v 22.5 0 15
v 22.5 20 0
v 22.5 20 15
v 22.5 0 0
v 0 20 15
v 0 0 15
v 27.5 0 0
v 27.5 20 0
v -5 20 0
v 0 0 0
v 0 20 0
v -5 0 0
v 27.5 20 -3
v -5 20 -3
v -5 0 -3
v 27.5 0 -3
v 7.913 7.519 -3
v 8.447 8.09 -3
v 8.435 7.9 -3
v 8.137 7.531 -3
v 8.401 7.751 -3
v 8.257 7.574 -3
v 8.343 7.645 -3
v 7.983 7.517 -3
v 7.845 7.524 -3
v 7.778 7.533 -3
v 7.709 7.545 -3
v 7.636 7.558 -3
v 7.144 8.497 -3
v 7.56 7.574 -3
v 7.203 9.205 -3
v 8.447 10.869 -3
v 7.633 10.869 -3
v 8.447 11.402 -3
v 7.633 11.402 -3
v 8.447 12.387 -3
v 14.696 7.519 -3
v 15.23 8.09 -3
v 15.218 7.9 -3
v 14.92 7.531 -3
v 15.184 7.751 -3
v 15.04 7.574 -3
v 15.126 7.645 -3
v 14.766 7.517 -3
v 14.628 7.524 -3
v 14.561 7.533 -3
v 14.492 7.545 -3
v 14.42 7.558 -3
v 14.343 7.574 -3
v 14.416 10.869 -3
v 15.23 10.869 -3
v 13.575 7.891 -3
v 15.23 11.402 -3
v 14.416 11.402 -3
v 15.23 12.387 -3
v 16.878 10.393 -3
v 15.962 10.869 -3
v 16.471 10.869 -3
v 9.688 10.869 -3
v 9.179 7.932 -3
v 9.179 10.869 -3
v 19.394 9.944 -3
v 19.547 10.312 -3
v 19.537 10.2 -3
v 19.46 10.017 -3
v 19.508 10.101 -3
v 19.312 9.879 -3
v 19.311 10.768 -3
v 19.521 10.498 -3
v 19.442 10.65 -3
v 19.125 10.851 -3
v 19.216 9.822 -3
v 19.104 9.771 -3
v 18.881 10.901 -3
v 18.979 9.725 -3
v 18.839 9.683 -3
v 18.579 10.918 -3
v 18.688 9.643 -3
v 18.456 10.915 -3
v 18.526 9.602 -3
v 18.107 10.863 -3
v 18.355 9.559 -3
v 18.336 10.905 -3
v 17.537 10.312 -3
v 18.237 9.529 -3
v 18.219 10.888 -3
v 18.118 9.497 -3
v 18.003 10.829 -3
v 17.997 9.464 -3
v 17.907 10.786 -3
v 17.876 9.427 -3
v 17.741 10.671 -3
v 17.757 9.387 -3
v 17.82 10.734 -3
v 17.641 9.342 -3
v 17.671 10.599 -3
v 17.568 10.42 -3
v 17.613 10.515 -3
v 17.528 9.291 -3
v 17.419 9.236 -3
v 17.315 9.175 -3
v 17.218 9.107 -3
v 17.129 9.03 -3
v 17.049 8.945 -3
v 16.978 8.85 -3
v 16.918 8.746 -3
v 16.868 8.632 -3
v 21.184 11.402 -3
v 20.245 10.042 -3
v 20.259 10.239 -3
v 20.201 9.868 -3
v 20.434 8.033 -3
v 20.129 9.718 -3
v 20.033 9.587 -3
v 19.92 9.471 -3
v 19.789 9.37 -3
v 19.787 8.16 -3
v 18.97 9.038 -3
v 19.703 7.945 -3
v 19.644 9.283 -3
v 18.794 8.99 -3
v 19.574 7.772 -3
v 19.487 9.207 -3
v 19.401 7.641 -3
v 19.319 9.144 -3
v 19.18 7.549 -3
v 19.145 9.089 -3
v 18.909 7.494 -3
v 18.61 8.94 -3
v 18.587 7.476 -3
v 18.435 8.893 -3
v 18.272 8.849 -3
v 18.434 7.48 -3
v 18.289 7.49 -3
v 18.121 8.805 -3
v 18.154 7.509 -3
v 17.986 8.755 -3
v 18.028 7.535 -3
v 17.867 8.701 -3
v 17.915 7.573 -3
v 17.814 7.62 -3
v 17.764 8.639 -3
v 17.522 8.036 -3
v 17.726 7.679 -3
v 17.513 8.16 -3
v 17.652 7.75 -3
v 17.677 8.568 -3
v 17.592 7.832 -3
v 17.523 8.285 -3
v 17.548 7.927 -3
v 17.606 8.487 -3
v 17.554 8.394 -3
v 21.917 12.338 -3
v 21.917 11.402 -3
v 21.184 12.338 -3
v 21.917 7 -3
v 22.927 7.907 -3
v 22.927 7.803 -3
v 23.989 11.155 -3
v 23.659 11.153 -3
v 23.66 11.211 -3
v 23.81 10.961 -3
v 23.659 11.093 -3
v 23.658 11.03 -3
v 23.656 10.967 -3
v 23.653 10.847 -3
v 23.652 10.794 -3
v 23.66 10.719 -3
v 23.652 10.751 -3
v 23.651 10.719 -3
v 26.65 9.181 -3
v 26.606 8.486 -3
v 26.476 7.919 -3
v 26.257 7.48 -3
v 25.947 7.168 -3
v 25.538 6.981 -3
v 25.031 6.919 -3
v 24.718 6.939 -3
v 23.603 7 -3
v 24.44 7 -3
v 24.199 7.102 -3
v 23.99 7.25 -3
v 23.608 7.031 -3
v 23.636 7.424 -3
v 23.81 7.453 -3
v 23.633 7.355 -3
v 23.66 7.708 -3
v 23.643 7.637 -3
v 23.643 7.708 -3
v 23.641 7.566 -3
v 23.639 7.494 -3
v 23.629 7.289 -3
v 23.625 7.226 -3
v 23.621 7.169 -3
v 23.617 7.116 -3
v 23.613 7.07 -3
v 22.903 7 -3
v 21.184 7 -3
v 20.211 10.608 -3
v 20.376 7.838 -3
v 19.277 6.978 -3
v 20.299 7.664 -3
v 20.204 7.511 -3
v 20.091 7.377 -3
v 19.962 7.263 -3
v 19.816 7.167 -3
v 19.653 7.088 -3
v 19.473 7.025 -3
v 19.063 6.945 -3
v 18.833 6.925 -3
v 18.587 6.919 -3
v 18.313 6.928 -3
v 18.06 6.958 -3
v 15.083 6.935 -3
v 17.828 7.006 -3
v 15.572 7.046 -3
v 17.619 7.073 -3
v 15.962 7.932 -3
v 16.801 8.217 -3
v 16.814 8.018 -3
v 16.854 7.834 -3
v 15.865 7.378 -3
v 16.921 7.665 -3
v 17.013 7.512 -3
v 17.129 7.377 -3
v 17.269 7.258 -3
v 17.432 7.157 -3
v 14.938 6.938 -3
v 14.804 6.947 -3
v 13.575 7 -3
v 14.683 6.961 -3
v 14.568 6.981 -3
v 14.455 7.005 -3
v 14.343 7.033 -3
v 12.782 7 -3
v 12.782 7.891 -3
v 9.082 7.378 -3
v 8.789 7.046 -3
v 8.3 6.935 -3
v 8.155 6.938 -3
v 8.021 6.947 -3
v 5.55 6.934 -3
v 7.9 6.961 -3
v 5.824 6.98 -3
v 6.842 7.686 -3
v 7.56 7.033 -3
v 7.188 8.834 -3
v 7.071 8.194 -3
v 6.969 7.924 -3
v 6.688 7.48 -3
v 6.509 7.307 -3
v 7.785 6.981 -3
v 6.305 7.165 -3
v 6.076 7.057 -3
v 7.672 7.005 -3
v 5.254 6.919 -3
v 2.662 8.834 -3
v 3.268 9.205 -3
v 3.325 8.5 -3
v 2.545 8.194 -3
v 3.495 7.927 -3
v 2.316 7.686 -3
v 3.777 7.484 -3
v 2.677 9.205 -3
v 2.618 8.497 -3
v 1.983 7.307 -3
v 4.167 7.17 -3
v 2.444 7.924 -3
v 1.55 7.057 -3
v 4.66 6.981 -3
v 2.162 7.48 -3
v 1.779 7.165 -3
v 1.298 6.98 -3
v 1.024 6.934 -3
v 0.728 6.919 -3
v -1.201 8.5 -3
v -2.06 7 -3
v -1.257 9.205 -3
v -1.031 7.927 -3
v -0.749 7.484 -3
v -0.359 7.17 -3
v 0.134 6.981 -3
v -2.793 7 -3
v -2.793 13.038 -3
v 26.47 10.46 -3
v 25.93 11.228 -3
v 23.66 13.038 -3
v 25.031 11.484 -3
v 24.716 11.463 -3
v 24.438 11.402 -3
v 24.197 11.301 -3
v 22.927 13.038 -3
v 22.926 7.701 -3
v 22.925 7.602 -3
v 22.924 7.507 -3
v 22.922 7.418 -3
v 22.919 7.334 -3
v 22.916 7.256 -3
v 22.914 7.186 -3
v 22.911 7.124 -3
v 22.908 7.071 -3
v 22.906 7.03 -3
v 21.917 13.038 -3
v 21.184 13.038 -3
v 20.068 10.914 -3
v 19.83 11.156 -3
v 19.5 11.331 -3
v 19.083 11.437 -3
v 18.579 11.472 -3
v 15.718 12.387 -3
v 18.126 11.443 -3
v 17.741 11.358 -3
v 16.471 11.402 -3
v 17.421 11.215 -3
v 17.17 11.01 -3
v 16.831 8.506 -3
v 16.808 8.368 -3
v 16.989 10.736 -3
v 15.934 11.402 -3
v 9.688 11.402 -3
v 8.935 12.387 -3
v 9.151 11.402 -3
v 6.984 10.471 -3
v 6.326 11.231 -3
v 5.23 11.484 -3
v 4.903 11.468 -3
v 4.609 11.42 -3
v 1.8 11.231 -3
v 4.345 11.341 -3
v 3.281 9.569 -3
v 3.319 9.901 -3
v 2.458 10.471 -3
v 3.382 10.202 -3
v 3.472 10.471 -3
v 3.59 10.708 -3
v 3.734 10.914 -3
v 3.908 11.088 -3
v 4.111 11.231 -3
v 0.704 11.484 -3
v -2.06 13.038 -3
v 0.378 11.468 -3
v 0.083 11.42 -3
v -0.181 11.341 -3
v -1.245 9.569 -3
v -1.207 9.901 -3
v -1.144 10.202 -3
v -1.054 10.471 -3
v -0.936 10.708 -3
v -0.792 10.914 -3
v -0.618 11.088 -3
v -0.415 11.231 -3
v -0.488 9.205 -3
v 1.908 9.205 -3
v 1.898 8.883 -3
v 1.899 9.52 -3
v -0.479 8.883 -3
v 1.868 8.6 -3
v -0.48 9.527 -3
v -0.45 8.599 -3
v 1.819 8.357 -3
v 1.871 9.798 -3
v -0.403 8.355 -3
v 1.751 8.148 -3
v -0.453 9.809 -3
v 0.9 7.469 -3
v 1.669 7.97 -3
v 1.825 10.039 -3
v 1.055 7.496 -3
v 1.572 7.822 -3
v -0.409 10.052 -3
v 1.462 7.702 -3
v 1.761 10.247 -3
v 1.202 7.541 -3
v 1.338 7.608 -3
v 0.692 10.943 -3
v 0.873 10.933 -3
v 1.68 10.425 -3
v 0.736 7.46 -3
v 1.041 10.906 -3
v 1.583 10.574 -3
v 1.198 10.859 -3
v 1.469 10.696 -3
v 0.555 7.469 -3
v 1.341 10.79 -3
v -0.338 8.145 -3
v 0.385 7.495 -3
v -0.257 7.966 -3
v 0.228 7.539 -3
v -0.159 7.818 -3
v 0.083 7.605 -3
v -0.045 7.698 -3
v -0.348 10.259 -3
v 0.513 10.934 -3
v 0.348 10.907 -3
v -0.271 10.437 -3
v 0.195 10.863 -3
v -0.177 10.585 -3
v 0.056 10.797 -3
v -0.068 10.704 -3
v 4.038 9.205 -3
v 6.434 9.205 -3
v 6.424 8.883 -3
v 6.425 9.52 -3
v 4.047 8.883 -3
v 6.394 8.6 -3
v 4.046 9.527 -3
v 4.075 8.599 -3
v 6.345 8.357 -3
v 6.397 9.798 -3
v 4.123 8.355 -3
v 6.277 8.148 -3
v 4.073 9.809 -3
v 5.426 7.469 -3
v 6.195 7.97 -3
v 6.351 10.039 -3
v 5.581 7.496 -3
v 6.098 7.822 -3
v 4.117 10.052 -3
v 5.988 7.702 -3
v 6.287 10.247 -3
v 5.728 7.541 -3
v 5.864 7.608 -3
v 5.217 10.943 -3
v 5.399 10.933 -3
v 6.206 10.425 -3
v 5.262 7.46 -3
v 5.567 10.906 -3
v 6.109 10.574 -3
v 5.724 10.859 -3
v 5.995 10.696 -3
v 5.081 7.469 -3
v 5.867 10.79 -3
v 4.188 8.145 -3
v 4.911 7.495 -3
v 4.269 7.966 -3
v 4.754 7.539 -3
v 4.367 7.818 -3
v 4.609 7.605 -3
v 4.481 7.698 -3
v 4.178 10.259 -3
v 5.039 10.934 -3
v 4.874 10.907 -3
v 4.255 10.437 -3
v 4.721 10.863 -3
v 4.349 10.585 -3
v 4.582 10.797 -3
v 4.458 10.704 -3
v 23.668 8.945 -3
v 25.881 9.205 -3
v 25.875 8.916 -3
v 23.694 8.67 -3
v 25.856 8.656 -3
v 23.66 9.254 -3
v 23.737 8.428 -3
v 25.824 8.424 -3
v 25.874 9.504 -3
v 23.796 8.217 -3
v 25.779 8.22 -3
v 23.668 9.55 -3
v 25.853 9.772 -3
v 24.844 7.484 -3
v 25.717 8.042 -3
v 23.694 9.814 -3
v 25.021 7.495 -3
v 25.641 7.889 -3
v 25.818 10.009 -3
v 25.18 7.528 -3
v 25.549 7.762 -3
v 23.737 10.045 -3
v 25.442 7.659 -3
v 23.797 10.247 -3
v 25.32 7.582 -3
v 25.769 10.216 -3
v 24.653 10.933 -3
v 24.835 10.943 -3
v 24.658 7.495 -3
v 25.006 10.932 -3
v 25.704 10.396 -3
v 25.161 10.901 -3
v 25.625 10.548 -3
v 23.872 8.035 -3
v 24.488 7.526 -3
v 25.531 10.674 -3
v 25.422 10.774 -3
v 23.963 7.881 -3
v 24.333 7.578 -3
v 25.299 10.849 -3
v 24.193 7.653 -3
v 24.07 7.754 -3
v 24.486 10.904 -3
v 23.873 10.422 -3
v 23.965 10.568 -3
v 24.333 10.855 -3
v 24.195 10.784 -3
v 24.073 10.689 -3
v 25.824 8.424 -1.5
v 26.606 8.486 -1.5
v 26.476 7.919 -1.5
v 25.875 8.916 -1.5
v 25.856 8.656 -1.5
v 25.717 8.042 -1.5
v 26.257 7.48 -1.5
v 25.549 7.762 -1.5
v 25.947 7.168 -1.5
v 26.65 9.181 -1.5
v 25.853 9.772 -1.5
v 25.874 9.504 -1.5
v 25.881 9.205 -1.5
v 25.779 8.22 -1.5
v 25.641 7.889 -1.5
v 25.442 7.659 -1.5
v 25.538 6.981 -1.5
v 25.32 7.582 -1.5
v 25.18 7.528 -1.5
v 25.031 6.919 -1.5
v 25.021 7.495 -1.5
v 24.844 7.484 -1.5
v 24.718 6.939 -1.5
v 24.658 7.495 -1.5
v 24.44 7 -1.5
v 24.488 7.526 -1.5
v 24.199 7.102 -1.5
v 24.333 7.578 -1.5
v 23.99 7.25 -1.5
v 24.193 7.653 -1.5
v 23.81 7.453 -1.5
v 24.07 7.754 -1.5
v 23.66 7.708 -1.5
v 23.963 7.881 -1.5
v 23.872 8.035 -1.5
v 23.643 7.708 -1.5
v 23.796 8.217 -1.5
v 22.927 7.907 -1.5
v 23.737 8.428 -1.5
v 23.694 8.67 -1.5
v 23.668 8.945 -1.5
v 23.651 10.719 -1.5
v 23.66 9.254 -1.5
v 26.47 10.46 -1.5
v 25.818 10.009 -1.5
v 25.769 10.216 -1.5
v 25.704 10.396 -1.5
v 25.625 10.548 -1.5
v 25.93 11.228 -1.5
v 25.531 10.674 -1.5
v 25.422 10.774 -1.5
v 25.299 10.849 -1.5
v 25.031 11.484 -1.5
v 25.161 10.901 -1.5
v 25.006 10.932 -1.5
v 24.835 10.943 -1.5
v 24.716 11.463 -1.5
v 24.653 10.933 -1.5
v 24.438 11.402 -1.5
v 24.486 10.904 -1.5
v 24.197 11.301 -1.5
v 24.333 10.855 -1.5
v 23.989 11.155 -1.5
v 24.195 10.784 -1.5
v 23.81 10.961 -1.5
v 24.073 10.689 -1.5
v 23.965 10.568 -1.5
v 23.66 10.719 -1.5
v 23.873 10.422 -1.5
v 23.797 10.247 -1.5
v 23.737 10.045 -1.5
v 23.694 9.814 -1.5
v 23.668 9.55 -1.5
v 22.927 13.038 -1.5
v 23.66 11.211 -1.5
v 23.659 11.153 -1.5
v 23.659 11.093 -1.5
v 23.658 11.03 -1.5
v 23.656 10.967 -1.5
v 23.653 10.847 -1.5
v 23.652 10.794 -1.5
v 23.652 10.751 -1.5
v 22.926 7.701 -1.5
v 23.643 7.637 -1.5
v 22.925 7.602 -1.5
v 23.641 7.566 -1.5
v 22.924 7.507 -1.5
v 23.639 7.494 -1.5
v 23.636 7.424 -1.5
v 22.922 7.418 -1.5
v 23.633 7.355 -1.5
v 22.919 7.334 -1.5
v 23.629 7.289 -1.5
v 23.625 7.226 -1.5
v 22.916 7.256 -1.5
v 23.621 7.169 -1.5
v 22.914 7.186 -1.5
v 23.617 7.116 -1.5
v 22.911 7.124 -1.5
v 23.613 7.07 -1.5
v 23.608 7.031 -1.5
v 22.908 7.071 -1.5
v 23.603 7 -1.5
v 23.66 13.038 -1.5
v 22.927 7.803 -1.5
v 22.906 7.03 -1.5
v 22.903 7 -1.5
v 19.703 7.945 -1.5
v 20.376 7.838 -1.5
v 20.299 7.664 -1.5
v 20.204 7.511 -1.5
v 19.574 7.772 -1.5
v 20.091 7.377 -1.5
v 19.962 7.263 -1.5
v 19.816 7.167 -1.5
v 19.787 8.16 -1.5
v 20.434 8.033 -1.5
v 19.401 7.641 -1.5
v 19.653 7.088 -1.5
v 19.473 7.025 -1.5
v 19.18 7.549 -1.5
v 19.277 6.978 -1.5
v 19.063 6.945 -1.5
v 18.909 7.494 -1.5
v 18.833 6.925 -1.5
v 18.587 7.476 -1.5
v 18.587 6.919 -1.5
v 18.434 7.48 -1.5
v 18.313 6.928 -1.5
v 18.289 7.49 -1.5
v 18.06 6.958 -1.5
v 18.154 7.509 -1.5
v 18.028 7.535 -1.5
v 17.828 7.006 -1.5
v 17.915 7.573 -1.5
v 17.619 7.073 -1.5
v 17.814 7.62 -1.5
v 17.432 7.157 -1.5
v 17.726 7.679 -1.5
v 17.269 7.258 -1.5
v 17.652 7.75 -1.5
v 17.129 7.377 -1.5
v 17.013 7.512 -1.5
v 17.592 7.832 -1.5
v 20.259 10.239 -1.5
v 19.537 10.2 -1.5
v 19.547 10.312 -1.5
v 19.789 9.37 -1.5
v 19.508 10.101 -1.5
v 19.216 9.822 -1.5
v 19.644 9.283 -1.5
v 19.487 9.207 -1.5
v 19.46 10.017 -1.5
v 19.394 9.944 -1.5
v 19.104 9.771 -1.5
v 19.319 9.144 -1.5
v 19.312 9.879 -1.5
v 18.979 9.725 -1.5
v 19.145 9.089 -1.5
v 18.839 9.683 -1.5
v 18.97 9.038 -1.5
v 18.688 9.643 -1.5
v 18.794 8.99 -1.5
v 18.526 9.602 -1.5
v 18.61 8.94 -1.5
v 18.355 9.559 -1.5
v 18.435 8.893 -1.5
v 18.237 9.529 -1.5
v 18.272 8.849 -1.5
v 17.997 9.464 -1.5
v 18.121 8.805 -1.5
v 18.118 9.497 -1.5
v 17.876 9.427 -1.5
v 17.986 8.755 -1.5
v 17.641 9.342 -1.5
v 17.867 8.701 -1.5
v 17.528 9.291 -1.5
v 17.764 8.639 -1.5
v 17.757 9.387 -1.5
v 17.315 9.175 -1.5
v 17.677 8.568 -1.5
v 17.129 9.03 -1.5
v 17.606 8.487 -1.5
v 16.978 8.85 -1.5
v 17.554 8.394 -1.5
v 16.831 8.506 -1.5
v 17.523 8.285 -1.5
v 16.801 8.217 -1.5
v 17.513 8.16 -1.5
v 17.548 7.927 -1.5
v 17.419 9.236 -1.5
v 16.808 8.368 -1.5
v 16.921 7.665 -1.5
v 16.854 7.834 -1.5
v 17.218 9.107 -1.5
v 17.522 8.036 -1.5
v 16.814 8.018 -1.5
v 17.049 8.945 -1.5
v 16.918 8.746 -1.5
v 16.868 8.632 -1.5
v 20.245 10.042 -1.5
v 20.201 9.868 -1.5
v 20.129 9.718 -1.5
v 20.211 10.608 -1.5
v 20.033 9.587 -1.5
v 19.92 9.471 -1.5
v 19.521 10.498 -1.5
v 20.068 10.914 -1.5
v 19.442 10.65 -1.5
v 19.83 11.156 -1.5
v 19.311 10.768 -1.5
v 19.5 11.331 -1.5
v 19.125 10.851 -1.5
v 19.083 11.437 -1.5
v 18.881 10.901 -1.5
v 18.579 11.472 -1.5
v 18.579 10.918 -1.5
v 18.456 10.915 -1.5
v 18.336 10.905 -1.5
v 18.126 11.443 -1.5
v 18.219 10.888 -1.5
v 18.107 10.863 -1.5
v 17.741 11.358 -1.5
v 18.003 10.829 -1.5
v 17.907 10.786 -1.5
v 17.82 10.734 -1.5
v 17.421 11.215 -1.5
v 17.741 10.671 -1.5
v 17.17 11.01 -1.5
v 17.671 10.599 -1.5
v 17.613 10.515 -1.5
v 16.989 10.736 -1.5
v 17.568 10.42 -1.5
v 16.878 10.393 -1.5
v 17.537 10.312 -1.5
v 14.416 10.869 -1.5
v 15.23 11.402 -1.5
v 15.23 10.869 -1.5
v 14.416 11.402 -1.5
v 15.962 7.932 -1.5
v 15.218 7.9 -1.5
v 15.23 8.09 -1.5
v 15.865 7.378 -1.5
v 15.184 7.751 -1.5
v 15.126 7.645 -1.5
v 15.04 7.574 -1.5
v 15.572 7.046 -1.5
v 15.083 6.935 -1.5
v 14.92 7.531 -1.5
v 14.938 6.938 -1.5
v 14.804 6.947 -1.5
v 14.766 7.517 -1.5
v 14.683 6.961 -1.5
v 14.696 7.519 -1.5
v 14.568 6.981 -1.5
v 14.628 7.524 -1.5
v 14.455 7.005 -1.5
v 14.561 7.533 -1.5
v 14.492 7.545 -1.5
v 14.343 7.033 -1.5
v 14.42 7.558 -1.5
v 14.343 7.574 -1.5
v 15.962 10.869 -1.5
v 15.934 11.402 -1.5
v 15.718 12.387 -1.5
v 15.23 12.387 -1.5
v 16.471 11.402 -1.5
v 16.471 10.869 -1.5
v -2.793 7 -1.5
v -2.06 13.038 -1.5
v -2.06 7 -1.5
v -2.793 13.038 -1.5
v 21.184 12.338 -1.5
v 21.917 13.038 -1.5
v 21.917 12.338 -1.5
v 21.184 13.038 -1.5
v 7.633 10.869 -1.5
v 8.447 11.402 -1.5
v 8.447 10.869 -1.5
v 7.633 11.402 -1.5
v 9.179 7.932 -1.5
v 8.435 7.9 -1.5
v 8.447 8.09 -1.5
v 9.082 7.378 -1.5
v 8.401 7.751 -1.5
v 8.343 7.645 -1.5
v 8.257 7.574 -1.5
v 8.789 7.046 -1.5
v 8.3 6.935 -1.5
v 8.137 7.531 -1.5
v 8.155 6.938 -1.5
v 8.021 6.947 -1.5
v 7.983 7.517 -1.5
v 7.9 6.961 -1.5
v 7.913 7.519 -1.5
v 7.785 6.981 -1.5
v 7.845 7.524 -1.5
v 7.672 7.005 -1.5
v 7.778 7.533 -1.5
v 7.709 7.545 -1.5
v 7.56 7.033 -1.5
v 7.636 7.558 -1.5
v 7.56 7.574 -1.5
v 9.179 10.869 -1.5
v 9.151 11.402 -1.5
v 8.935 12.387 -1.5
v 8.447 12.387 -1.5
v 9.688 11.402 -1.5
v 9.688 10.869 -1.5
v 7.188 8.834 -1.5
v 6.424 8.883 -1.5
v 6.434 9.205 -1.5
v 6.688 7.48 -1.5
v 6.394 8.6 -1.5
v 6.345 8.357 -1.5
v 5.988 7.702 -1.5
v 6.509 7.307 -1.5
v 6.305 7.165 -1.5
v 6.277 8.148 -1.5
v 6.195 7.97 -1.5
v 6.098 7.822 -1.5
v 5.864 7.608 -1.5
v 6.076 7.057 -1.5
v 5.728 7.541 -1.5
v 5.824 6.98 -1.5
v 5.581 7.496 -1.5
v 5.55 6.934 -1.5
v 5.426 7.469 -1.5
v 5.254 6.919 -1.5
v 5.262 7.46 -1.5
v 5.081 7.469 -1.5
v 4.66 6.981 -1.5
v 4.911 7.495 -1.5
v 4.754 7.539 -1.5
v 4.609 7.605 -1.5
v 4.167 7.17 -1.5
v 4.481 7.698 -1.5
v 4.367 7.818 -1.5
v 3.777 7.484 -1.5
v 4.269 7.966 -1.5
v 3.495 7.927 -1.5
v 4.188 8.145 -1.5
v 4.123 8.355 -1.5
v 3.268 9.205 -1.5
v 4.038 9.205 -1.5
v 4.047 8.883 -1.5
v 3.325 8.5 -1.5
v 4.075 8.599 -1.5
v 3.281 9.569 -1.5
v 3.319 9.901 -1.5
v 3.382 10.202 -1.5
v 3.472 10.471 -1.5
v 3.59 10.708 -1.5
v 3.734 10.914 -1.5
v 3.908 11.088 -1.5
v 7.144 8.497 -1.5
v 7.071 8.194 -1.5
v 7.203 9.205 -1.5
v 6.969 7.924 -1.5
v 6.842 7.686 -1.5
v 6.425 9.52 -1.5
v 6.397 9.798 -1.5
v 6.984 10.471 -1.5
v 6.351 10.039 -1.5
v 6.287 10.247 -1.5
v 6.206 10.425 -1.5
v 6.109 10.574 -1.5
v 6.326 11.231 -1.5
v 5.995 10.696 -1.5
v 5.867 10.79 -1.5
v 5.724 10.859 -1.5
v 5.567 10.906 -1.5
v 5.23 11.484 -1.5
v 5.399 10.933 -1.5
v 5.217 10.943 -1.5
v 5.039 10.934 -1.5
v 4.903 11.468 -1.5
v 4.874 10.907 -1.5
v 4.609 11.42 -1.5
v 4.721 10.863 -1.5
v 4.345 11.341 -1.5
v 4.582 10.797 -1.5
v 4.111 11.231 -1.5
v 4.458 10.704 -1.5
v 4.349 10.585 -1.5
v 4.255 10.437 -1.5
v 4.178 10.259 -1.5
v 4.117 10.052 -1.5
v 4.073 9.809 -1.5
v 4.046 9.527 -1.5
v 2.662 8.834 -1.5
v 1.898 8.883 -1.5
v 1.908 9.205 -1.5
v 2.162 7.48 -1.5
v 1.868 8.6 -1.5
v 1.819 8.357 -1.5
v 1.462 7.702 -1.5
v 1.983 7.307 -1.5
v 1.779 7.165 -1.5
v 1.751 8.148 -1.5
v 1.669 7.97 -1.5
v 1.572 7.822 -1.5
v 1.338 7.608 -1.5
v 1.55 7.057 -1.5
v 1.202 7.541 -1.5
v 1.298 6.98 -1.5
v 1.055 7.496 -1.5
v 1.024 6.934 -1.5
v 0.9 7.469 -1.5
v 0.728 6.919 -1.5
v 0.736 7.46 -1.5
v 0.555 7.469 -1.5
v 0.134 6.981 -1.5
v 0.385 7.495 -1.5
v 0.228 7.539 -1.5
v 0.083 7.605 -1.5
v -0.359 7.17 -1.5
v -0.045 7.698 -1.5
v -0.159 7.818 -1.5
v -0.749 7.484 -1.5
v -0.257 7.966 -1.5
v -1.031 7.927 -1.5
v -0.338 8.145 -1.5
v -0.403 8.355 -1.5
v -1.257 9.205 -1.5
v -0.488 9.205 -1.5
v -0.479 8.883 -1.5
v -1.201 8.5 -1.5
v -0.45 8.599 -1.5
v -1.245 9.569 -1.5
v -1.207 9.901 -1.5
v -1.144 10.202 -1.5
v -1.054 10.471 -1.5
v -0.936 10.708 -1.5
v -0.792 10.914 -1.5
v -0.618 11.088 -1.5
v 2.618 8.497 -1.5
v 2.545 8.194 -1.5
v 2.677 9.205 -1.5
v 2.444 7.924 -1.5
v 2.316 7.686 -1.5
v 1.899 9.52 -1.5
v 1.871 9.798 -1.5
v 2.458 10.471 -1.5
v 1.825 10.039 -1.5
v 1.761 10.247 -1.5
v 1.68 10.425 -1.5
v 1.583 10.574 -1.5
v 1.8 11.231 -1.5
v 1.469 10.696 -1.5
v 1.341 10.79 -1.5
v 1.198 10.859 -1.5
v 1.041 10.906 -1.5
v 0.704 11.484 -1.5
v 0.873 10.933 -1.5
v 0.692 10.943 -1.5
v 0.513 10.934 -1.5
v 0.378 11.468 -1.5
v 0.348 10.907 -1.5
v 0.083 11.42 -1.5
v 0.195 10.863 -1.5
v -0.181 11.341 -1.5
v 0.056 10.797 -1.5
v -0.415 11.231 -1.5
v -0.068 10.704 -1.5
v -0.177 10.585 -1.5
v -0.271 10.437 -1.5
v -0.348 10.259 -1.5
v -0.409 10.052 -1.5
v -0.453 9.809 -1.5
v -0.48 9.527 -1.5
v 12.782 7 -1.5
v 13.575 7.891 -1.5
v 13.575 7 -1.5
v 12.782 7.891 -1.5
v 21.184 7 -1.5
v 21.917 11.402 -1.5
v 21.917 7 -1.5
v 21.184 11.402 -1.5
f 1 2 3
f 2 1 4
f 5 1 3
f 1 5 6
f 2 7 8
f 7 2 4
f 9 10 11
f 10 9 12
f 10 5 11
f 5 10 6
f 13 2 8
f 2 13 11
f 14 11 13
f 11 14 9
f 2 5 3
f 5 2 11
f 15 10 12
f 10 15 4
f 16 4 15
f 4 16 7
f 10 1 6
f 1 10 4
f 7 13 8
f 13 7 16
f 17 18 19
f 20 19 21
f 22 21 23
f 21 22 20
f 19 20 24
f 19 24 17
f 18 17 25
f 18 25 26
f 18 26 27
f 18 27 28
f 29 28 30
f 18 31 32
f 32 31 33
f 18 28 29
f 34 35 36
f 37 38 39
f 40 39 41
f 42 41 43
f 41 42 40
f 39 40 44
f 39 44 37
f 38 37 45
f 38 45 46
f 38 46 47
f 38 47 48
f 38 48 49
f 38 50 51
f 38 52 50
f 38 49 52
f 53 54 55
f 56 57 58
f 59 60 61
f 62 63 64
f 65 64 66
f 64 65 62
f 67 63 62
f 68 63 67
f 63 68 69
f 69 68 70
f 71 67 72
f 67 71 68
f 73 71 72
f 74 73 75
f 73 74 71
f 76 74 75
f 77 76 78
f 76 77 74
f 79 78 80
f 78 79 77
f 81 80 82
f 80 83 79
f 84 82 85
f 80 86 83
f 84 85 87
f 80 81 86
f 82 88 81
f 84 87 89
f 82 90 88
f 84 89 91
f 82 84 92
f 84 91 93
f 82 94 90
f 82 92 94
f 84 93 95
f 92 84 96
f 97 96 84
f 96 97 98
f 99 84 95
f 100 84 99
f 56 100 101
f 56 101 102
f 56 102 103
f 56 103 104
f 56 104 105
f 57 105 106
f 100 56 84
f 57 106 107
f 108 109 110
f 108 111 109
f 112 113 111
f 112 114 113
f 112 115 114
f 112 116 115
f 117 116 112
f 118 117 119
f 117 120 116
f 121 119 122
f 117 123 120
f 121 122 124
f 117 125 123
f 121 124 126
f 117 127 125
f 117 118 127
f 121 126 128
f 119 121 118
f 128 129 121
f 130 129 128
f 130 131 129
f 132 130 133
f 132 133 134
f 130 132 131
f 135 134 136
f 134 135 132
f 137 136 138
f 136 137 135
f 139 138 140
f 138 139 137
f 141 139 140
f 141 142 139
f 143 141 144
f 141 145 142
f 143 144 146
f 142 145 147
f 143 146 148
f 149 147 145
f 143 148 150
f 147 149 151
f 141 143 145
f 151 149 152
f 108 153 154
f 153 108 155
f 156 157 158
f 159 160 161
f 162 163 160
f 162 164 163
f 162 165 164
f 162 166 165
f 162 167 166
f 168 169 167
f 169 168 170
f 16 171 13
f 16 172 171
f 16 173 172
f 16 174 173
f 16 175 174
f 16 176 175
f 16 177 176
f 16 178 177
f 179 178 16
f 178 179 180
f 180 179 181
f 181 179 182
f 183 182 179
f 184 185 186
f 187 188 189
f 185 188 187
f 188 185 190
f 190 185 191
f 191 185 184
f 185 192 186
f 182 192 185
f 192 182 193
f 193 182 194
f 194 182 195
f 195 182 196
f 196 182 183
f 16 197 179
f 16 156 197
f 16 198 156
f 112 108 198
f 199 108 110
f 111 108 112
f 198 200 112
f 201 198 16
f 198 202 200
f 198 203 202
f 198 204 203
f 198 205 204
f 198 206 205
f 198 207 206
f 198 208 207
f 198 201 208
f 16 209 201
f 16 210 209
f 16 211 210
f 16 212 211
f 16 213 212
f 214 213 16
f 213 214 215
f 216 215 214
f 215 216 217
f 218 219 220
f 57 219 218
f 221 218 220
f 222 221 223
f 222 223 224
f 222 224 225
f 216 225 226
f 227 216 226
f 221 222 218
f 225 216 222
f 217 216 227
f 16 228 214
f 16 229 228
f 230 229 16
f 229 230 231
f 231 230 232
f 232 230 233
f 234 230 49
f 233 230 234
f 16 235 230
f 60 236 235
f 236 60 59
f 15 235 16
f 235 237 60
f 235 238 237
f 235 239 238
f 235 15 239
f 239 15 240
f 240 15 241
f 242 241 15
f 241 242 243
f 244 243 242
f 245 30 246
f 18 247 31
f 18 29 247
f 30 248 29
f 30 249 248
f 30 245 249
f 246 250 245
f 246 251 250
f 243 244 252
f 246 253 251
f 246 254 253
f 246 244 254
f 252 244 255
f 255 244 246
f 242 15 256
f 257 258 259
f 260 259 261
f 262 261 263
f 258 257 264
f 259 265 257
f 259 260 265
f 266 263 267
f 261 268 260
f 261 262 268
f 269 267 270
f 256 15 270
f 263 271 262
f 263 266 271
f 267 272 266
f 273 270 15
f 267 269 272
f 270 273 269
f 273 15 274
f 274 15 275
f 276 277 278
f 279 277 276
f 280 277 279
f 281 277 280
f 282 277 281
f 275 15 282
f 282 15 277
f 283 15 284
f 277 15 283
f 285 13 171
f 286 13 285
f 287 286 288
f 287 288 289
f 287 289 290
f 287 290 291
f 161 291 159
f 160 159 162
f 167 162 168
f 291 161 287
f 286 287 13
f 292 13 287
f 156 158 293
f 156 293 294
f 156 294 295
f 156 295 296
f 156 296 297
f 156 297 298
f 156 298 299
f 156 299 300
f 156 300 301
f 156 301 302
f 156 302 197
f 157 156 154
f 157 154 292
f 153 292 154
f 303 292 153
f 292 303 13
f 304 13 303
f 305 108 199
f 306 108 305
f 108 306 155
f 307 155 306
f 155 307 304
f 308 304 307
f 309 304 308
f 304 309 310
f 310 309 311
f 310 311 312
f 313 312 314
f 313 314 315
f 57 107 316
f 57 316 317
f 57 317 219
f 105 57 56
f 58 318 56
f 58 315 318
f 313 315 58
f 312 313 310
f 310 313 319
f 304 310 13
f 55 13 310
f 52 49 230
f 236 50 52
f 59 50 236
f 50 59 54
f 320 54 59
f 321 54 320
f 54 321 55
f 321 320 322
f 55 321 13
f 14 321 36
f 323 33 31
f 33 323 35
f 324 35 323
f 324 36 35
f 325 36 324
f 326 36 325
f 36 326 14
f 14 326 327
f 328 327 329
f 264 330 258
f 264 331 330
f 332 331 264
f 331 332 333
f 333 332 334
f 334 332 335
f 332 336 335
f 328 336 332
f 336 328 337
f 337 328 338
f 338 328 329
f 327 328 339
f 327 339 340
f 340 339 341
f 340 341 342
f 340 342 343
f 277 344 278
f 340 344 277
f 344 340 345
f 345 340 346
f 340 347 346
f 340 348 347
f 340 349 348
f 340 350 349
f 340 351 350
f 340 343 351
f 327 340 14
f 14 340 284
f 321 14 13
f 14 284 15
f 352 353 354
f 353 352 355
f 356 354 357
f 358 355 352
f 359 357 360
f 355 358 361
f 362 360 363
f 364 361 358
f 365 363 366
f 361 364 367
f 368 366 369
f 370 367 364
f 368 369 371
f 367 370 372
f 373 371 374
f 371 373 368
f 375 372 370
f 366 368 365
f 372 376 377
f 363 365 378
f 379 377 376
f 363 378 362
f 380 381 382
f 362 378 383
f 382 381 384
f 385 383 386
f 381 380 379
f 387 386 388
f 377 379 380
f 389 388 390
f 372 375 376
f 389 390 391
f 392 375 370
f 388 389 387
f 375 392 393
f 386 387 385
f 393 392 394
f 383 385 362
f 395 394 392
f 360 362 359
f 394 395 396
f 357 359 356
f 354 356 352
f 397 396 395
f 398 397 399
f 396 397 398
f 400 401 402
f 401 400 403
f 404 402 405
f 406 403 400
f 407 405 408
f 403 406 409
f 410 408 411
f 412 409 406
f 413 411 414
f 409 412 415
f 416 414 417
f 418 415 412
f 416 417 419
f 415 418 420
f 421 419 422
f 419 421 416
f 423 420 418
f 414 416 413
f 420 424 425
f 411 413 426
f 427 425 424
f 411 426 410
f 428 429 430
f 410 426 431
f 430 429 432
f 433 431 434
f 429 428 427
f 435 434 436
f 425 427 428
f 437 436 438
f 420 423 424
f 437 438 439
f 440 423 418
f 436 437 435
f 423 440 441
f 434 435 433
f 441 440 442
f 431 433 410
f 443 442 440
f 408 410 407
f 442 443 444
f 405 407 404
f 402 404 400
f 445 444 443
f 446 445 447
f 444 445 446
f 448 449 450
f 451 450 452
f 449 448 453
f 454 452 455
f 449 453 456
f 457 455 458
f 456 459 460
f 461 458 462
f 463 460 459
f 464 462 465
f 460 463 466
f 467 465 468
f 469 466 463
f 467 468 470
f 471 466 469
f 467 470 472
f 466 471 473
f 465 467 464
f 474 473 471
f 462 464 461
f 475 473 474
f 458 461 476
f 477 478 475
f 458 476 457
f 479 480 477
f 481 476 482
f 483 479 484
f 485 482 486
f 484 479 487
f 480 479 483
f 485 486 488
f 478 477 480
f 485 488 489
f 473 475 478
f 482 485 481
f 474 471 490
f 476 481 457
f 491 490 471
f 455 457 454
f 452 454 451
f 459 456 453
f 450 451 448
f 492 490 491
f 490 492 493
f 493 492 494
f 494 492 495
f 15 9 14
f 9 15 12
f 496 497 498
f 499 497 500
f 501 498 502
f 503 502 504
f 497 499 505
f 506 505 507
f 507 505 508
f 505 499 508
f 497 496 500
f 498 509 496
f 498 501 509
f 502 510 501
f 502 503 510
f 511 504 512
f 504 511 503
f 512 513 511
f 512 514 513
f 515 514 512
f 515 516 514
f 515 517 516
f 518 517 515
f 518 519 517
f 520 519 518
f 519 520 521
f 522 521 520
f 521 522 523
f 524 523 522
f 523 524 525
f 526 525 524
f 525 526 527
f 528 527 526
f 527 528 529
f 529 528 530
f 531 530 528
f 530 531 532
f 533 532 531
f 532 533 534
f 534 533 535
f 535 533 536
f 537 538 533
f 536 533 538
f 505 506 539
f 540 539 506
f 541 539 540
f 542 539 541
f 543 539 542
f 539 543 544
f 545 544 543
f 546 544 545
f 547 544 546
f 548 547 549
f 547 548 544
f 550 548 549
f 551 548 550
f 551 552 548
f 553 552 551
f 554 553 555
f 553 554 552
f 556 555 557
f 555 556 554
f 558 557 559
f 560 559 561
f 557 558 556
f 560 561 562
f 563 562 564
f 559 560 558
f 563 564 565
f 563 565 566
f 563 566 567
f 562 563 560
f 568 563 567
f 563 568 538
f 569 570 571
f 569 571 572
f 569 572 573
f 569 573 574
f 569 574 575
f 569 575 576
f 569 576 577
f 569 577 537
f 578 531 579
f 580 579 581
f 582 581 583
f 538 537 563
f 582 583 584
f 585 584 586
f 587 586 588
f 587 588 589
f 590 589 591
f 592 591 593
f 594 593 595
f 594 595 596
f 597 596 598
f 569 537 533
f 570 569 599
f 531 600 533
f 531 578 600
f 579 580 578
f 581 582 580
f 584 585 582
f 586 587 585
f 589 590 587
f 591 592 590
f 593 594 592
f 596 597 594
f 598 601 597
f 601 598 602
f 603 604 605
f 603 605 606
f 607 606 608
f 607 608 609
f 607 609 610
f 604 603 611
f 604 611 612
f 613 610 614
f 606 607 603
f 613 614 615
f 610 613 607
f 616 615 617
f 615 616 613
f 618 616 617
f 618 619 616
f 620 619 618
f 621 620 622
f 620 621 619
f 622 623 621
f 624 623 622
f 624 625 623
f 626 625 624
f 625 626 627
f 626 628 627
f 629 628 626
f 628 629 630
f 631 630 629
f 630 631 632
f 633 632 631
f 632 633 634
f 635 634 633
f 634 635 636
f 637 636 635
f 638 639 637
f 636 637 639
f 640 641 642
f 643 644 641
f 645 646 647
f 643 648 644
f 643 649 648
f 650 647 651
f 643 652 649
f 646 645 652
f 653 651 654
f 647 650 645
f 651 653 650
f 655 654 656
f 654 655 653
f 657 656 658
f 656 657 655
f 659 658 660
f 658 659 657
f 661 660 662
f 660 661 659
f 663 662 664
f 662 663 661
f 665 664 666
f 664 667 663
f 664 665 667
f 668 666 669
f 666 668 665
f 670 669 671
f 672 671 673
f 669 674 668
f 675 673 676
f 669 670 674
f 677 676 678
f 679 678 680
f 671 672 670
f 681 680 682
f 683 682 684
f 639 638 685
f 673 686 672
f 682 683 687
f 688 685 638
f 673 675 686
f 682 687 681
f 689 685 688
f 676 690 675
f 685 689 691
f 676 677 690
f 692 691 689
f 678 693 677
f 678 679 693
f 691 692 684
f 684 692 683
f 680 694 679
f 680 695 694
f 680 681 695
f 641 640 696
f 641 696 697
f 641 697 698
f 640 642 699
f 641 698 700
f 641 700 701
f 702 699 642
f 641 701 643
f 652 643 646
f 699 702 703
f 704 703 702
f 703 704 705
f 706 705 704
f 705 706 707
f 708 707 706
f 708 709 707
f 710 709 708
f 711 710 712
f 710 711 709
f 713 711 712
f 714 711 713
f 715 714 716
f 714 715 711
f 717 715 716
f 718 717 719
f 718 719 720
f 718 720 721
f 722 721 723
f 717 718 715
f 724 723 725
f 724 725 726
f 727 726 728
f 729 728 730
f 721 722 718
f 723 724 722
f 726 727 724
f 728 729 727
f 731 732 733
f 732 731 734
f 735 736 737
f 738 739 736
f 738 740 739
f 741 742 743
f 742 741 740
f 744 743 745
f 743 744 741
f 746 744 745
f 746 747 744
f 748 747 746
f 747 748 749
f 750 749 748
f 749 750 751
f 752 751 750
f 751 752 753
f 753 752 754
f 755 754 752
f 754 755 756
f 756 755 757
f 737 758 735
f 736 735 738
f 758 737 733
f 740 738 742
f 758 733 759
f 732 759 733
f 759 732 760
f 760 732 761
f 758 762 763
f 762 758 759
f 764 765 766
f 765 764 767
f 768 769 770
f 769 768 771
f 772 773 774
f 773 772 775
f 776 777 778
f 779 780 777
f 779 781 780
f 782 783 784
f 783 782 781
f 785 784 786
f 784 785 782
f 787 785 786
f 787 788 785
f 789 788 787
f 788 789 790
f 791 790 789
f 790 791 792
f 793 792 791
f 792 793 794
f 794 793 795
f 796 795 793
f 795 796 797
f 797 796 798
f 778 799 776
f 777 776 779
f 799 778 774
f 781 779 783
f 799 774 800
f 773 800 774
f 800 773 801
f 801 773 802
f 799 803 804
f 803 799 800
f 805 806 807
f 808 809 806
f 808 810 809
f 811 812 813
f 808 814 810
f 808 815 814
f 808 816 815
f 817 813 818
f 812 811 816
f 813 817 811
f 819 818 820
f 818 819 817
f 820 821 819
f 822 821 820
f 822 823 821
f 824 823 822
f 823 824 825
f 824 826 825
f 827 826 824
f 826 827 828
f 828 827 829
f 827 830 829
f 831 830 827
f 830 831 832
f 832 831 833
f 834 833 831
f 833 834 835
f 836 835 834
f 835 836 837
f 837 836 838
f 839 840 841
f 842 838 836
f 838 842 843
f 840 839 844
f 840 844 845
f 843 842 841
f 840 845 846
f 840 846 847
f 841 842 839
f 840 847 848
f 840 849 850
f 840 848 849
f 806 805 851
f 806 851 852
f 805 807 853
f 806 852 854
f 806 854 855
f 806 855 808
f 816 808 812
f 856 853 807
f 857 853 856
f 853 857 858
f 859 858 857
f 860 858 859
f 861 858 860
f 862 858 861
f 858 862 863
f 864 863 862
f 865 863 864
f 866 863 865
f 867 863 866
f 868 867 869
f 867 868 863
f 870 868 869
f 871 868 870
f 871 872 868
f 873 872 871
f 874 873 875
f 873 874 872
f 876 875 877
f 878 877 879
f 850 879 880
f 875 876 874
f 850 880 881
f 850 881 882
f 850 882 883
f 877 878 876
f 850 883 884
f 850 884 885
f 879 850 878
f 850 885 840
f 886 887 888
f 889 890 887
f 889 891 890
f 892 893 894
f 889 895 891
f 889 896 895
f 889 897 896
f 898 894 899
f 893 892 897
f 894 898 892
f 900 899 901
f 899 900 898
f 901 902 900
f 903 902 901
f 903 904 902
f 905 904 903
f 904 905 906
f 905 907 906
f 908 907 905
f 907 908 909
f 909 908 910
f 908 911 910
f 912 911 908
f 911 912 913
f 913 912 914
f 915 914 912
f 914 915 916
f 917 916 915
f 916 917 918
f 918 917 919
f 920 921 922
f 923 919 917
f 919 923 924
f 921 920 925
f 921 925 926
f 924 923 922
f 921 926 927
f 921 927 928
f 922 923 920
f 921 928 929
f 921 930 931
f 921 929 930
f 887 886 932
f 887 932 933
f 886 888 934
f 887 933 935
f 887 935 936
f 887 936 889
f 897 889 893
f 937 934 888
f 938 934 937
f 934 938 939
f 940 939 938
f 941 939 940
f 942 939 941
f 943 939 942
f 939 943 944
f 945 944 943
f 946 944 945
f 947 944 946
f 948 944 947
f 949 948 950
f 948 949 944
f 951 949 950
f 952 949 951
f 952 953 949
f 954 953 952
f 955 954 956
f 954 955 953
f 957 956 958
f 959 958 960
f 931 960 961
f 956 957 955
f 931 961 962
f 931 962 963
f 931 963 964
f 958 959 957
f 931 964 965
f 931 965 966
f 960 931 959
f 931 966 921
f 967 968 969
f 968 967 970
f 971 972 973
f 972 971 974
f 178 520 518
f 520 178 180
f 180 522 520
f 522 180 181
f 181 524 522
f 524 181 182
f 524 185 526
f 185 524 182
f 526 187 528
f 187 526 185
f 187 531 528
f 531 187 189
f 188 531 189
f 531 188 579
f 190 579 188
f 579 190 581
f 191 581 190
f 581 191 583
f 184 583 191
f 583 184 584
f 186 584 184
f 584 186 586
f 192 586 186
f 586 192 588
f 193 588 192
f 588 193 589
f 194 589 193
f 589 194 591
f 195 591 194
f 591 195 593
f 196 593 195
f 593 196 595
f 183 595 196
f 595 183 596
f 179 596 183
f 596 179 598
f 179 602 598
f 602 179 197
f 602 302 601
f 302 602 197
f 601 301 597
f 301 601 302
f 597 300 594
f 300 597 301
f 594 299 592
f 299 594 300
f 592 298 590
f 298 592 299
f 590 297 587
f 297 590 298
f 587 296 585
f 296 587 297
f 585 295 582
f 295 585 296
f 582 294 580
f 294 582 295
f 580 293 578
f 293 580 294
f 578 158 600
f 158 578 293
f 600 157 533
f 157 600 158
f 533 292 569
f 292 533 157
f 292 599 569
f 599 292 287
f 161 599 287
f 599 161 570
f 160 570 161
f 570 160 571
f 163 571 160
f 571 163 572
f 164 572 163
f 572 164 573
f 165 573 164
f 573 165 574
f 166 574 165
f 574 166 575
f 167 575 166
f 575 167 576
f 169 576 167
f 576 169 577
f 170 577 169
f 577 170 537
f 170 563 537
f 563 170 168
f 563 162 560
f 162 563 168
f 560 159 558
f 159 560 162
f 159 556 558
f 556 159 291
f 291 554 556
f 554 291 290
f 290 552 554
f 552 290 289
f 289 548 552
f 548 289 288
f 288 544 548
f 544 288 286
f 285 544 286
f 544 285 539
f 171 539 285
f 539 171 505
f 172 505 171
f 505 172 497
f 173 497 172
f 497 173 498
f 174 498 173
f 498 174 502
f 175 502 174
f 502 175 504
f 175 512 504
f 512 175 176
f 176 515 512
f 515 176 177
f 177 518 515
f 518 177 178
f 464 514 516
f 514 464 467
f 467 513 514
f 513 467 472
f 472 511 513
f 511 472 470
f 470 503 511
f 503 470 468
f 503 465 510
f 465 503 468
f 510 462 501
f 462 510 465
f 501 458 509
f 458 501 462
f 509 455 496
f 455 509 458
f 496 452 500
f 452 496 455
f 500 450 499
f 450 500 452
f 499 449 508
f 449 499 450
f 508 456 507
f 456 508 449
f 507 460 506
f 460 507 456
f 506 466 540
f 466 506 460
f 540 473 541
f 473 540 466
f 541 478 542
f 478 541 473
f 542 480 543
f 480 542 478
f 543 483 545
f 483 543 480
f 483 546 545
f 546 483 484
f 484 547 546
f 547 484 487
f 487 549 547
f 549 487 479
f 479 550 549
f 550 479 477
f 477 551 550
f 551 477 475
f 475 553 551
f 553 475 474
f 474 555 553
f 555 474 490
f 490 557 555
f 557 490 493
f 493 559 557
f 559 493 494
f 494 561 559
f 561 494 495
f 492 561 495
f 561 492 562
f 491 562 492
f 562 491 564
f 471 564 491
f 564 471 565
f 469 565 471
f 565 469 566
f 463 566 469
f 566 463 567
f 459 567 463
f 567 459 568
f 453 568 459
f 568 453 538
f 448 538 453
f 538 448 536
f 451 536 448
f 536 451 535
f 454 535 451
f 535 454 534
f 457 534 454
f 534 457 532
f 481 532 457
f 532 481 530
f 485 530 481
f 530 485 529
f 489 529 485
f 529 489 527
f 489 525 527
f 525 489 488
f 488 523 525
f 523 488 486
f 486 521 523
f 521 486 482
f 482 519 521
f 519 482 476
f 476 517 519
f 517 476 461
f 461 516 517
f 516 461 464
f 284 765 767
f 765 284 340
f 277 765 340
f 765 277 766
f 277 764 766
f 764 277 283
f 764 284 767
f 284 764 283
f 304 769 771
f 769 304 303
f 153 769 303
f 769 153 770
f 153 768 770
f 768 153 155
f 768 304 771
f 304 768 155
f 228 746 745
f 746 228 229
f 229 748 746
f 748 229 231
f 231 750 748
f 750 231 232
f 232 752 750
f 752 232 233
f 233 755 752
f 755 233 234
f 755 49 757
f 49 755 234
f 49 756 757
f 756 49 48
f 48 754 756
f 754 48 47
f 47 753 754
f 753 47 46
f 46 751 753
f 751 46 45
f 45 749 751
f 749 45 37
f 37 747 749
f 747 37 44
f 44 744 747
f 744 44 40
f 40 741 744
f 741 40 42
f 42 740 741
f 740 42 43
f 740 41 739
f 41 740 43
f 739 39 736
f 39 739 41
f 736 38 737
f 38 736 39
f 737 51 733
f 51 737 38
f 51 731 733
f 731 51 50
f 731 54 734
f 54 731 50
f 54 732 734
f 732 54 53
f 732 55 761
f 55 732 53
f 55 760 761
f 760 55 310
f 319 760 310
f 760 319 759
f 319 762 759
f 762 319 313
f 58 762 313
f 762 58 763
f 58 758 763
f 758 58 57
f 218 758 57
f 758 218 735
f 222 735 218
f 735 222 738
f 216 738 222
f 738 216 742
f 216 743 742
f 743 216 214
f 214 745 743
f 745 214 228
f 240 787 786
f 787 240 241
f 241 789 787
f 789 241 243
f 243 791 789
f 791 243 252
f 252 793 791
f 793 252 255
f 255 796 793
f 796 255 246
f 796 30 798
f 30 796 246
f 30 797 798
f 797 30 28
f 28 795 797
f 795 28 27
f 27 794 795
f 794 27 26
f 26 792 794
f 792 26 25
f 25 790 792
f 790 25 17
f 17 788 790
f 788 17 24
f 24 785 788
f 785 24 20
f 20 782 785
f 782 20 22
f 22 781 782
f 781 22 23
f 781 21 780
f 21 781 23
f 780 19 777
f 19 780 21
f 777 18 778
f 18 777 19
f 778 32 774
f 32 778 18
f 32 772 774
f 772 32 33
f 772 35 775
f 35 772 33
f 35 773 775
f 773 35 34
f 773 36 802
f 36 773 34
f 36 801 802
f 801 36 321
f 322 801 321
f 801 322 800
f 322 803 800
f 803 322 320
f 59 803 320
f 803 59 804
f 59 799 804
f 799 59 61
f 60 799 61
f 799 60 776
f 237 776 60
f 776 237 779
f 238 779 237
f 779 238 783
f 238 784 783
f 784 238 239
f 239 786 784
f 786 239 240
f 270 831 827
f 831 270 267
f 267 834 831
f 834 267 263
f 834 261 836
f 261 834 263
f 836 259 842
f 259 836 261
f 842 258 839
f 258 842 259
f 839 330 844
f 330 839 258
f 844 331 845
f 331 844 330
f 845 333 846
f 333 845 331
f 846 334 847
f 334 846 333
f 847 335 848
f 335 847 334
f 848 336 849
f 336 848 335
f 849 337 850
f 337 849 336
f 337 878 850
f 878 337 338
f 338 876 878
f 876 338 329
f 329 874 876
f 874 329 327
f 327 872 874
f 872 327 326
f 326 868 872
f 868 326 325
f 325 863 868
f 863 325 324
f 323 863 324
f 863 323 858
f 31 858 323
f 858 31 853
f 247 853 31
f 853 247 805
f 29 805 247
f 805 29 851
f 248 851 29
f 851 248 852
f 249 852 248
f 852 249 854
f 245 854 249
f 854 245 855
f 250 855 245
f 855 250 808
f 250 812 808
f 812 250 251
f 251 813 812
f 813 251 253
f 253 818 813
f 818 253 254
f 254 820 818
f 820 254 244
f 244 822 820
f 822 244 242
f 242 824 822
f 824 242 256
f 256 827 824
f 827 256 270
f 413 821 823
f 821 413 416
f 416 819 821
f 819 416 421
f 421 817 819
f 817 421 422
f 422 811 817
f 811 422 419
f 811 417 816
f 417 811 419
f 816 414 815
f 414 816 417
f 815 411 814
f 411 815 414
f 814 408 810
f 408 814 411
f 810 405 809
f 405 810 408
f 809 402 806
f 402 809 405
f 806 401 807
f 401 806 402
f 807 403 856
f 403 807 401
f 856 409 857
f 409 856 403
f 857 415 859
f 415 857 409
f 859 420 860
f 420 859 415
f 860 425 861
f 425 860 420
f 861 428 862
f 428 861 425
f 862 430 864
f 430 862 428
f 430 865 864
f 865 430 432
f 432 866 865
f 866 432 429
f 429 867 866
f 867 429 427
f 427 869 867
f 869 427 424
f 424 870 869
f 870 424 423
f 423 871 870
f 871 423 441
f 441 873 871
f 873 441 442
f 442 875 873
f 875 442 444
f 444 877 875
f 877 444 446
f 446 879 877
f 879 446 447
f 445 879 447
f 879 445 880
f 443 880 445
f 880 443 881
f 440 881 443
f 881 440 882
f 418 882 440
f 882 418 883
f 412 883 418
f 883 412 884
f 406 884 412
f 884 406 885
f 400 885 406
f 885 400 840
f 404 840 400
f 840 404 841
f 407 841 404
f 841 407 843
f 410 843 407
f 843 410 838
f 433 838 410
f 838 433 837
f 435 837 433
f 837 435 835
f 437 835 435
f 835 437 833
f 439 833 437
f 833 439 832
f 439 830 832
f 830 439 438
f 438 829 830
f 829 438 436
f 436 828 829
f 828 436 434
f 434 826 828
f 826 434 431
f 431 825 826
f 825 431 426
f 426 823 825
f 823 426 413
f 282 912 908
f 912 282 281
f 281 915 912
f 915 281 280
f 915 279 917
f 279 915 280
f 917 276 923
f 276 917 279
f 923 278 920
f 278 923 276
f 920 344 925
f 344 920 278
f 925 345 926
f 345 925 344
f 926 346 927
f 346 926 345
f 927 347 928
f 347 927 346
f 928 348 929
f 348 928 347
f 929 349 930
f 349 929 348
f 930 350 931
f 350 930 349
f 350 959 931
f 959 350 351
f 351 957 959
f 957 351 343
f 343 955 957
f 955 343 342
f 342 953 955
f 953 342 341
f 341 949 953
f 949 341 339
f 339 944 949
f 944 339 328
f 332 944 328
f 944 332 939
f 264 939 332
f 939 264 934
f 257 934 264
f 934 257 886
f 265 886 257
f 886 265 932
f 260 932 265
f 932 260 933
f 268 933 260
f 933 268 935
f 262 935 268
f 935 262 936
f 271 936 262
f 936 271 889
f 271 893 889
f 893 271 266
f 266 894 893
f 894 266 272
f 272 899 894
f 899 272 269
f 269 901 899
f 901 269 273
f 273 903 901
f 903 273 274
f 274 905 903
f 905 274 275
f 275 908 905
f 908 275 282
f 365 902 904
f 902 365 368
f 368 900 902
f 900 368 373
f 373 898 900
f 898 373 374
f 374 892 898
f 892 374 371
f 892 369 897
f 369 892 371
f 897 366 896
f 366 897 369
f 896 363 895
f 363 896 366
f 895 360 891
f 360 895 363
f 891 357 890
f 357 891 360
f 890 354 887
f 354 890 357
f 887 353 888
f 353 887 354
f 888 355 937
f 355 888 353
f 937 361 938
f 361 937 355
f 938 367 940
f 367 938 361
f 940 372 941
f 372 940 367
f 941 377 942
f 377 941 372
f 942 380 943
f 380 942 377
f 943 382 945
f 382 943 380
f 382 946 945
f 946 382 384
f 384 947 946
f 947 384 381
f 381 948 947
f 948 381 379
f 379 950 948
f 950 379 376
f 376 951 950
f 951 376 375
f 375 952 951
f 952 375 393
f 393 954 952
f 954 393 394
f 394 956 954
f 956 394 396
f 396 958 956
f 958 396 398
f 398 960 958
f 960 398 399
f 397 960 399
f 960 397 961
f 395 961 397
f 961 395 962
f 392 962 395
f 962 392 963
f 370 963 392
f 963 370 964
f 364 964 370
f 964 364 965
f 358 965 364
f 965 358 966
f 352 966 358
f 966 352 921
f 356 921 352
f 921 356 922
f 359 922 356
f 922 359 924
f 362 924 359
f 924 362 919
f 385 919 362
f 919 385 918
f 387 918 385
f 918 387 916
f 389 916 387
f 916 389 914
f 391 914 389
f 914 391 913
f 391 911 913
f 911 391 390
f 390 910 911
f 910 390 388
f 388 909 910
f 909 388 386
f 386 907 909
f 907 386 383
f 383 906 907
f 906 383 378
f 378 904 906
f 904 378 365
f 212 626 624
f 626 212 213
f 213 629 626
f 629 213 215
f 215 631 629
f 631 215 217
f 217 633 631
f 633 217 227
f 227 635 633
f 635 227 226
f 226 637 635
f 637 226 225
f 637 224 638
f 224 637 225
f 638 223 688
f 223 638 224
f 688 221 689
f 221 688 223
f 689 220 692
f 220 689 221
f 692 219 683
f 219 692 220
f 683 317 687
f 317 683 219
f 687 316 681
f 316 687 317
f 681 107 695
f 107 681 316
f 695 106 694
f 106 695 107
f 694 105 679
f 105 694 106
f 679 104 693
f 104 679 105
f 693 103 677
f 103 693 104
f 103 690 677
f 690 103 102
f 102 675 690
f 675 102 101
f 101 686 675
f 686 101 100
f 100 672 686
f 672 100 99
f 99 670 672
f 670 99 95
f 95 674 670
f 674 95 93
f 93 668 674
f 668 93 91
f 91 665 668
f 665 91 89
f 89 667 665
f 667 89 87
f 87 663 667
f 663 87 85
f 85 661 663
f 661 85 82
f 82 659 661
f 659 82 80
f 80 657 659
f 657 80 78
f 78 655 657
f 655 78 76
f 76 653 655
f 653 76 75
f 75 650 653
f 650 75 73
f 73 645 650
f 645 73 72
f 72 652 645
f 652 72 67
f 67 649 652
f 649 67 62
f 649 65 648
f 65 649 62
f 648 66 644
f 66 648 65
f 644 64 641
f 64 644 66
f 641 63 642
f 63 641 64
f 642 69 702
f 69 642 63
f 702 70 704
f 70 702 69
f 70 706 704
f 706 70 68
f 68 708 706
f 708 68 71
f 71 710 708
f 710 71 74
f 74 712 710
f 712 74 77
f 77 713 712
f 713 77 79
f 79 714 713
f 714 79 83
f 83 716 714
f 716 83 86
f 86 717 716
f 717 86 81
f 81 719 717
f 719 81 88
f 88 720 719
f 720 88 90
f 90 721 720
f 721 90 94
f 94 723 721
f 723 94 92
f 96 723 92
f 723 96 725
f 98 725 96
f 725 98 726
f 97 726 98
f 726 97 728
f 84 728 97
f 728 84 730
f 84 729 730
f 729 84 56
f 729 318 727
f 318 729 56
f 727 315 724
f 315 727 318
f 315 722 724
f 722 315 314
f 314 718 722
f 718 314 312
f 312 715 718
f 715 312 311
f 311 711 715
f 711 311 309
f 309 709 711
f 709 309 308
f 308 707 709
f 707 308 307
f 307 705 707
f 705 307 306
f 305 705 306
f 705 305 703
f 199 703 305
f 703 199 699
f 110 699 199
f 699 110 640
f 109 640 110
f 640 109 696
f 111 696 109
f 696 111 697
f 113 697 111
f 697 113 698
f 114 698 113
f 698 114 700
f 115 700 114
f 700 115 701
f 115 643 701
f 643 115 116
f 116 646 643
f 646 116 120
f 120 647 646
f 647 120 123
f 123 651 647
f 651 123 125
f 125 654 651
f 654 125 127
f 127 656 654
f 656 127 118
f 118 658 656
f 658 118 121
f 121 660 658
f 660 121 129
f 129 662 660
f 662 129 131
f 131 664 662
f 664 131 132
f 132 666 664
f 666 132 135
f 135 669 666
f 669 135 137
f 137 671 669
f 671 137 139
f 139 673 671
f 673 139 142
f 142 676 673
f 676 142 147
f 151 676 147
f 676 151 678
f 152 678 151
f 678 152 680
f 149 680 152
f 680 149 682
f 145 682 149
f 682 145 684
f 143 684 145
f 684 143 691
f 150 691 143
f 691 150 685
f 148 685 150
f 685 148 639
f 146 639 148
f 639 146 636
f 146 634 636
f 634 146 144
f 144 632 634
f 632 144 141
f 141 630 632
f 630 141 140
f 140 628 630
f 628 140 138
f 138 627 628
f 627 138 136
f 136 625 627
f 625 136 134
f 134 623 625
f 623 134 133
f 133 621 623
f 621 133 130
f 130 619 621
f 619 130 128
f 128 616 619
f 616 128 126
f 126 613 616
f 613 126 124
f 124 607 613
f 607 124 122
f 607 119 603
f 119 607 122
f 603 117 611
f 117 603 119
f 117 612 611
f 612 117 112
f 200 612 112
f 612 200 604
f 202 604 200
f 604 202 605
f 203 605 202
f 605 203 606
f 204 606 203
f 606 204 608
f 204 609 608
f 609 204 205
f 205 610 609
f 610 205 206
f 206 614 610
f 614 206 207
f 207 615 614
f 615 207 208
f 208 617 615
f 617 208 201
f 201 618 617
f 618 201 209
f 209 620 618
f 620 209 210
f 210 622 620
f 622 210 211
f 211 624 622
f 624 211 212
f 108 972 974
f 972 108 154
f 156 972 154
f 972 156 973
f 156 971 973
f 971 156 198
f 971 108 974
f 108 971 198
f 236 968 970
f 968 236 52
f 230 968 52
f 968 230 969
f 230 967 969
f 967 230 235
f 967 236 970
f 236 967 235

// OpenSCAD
//distance tool 28.5 mm

difference() {
    union() {
        cube([22.5, 20, 15]);
        translate([-5, 0, -3]) cube([22.5+10, 20, 3]);
    }
    string = str("dist. tool");
    #translate ([27, 7, -1.5]) rotate([0, 180, 0])
    linear_extrude(2.0) text(string, size = 6, direction = "ltr", spacing = 1 );
}
